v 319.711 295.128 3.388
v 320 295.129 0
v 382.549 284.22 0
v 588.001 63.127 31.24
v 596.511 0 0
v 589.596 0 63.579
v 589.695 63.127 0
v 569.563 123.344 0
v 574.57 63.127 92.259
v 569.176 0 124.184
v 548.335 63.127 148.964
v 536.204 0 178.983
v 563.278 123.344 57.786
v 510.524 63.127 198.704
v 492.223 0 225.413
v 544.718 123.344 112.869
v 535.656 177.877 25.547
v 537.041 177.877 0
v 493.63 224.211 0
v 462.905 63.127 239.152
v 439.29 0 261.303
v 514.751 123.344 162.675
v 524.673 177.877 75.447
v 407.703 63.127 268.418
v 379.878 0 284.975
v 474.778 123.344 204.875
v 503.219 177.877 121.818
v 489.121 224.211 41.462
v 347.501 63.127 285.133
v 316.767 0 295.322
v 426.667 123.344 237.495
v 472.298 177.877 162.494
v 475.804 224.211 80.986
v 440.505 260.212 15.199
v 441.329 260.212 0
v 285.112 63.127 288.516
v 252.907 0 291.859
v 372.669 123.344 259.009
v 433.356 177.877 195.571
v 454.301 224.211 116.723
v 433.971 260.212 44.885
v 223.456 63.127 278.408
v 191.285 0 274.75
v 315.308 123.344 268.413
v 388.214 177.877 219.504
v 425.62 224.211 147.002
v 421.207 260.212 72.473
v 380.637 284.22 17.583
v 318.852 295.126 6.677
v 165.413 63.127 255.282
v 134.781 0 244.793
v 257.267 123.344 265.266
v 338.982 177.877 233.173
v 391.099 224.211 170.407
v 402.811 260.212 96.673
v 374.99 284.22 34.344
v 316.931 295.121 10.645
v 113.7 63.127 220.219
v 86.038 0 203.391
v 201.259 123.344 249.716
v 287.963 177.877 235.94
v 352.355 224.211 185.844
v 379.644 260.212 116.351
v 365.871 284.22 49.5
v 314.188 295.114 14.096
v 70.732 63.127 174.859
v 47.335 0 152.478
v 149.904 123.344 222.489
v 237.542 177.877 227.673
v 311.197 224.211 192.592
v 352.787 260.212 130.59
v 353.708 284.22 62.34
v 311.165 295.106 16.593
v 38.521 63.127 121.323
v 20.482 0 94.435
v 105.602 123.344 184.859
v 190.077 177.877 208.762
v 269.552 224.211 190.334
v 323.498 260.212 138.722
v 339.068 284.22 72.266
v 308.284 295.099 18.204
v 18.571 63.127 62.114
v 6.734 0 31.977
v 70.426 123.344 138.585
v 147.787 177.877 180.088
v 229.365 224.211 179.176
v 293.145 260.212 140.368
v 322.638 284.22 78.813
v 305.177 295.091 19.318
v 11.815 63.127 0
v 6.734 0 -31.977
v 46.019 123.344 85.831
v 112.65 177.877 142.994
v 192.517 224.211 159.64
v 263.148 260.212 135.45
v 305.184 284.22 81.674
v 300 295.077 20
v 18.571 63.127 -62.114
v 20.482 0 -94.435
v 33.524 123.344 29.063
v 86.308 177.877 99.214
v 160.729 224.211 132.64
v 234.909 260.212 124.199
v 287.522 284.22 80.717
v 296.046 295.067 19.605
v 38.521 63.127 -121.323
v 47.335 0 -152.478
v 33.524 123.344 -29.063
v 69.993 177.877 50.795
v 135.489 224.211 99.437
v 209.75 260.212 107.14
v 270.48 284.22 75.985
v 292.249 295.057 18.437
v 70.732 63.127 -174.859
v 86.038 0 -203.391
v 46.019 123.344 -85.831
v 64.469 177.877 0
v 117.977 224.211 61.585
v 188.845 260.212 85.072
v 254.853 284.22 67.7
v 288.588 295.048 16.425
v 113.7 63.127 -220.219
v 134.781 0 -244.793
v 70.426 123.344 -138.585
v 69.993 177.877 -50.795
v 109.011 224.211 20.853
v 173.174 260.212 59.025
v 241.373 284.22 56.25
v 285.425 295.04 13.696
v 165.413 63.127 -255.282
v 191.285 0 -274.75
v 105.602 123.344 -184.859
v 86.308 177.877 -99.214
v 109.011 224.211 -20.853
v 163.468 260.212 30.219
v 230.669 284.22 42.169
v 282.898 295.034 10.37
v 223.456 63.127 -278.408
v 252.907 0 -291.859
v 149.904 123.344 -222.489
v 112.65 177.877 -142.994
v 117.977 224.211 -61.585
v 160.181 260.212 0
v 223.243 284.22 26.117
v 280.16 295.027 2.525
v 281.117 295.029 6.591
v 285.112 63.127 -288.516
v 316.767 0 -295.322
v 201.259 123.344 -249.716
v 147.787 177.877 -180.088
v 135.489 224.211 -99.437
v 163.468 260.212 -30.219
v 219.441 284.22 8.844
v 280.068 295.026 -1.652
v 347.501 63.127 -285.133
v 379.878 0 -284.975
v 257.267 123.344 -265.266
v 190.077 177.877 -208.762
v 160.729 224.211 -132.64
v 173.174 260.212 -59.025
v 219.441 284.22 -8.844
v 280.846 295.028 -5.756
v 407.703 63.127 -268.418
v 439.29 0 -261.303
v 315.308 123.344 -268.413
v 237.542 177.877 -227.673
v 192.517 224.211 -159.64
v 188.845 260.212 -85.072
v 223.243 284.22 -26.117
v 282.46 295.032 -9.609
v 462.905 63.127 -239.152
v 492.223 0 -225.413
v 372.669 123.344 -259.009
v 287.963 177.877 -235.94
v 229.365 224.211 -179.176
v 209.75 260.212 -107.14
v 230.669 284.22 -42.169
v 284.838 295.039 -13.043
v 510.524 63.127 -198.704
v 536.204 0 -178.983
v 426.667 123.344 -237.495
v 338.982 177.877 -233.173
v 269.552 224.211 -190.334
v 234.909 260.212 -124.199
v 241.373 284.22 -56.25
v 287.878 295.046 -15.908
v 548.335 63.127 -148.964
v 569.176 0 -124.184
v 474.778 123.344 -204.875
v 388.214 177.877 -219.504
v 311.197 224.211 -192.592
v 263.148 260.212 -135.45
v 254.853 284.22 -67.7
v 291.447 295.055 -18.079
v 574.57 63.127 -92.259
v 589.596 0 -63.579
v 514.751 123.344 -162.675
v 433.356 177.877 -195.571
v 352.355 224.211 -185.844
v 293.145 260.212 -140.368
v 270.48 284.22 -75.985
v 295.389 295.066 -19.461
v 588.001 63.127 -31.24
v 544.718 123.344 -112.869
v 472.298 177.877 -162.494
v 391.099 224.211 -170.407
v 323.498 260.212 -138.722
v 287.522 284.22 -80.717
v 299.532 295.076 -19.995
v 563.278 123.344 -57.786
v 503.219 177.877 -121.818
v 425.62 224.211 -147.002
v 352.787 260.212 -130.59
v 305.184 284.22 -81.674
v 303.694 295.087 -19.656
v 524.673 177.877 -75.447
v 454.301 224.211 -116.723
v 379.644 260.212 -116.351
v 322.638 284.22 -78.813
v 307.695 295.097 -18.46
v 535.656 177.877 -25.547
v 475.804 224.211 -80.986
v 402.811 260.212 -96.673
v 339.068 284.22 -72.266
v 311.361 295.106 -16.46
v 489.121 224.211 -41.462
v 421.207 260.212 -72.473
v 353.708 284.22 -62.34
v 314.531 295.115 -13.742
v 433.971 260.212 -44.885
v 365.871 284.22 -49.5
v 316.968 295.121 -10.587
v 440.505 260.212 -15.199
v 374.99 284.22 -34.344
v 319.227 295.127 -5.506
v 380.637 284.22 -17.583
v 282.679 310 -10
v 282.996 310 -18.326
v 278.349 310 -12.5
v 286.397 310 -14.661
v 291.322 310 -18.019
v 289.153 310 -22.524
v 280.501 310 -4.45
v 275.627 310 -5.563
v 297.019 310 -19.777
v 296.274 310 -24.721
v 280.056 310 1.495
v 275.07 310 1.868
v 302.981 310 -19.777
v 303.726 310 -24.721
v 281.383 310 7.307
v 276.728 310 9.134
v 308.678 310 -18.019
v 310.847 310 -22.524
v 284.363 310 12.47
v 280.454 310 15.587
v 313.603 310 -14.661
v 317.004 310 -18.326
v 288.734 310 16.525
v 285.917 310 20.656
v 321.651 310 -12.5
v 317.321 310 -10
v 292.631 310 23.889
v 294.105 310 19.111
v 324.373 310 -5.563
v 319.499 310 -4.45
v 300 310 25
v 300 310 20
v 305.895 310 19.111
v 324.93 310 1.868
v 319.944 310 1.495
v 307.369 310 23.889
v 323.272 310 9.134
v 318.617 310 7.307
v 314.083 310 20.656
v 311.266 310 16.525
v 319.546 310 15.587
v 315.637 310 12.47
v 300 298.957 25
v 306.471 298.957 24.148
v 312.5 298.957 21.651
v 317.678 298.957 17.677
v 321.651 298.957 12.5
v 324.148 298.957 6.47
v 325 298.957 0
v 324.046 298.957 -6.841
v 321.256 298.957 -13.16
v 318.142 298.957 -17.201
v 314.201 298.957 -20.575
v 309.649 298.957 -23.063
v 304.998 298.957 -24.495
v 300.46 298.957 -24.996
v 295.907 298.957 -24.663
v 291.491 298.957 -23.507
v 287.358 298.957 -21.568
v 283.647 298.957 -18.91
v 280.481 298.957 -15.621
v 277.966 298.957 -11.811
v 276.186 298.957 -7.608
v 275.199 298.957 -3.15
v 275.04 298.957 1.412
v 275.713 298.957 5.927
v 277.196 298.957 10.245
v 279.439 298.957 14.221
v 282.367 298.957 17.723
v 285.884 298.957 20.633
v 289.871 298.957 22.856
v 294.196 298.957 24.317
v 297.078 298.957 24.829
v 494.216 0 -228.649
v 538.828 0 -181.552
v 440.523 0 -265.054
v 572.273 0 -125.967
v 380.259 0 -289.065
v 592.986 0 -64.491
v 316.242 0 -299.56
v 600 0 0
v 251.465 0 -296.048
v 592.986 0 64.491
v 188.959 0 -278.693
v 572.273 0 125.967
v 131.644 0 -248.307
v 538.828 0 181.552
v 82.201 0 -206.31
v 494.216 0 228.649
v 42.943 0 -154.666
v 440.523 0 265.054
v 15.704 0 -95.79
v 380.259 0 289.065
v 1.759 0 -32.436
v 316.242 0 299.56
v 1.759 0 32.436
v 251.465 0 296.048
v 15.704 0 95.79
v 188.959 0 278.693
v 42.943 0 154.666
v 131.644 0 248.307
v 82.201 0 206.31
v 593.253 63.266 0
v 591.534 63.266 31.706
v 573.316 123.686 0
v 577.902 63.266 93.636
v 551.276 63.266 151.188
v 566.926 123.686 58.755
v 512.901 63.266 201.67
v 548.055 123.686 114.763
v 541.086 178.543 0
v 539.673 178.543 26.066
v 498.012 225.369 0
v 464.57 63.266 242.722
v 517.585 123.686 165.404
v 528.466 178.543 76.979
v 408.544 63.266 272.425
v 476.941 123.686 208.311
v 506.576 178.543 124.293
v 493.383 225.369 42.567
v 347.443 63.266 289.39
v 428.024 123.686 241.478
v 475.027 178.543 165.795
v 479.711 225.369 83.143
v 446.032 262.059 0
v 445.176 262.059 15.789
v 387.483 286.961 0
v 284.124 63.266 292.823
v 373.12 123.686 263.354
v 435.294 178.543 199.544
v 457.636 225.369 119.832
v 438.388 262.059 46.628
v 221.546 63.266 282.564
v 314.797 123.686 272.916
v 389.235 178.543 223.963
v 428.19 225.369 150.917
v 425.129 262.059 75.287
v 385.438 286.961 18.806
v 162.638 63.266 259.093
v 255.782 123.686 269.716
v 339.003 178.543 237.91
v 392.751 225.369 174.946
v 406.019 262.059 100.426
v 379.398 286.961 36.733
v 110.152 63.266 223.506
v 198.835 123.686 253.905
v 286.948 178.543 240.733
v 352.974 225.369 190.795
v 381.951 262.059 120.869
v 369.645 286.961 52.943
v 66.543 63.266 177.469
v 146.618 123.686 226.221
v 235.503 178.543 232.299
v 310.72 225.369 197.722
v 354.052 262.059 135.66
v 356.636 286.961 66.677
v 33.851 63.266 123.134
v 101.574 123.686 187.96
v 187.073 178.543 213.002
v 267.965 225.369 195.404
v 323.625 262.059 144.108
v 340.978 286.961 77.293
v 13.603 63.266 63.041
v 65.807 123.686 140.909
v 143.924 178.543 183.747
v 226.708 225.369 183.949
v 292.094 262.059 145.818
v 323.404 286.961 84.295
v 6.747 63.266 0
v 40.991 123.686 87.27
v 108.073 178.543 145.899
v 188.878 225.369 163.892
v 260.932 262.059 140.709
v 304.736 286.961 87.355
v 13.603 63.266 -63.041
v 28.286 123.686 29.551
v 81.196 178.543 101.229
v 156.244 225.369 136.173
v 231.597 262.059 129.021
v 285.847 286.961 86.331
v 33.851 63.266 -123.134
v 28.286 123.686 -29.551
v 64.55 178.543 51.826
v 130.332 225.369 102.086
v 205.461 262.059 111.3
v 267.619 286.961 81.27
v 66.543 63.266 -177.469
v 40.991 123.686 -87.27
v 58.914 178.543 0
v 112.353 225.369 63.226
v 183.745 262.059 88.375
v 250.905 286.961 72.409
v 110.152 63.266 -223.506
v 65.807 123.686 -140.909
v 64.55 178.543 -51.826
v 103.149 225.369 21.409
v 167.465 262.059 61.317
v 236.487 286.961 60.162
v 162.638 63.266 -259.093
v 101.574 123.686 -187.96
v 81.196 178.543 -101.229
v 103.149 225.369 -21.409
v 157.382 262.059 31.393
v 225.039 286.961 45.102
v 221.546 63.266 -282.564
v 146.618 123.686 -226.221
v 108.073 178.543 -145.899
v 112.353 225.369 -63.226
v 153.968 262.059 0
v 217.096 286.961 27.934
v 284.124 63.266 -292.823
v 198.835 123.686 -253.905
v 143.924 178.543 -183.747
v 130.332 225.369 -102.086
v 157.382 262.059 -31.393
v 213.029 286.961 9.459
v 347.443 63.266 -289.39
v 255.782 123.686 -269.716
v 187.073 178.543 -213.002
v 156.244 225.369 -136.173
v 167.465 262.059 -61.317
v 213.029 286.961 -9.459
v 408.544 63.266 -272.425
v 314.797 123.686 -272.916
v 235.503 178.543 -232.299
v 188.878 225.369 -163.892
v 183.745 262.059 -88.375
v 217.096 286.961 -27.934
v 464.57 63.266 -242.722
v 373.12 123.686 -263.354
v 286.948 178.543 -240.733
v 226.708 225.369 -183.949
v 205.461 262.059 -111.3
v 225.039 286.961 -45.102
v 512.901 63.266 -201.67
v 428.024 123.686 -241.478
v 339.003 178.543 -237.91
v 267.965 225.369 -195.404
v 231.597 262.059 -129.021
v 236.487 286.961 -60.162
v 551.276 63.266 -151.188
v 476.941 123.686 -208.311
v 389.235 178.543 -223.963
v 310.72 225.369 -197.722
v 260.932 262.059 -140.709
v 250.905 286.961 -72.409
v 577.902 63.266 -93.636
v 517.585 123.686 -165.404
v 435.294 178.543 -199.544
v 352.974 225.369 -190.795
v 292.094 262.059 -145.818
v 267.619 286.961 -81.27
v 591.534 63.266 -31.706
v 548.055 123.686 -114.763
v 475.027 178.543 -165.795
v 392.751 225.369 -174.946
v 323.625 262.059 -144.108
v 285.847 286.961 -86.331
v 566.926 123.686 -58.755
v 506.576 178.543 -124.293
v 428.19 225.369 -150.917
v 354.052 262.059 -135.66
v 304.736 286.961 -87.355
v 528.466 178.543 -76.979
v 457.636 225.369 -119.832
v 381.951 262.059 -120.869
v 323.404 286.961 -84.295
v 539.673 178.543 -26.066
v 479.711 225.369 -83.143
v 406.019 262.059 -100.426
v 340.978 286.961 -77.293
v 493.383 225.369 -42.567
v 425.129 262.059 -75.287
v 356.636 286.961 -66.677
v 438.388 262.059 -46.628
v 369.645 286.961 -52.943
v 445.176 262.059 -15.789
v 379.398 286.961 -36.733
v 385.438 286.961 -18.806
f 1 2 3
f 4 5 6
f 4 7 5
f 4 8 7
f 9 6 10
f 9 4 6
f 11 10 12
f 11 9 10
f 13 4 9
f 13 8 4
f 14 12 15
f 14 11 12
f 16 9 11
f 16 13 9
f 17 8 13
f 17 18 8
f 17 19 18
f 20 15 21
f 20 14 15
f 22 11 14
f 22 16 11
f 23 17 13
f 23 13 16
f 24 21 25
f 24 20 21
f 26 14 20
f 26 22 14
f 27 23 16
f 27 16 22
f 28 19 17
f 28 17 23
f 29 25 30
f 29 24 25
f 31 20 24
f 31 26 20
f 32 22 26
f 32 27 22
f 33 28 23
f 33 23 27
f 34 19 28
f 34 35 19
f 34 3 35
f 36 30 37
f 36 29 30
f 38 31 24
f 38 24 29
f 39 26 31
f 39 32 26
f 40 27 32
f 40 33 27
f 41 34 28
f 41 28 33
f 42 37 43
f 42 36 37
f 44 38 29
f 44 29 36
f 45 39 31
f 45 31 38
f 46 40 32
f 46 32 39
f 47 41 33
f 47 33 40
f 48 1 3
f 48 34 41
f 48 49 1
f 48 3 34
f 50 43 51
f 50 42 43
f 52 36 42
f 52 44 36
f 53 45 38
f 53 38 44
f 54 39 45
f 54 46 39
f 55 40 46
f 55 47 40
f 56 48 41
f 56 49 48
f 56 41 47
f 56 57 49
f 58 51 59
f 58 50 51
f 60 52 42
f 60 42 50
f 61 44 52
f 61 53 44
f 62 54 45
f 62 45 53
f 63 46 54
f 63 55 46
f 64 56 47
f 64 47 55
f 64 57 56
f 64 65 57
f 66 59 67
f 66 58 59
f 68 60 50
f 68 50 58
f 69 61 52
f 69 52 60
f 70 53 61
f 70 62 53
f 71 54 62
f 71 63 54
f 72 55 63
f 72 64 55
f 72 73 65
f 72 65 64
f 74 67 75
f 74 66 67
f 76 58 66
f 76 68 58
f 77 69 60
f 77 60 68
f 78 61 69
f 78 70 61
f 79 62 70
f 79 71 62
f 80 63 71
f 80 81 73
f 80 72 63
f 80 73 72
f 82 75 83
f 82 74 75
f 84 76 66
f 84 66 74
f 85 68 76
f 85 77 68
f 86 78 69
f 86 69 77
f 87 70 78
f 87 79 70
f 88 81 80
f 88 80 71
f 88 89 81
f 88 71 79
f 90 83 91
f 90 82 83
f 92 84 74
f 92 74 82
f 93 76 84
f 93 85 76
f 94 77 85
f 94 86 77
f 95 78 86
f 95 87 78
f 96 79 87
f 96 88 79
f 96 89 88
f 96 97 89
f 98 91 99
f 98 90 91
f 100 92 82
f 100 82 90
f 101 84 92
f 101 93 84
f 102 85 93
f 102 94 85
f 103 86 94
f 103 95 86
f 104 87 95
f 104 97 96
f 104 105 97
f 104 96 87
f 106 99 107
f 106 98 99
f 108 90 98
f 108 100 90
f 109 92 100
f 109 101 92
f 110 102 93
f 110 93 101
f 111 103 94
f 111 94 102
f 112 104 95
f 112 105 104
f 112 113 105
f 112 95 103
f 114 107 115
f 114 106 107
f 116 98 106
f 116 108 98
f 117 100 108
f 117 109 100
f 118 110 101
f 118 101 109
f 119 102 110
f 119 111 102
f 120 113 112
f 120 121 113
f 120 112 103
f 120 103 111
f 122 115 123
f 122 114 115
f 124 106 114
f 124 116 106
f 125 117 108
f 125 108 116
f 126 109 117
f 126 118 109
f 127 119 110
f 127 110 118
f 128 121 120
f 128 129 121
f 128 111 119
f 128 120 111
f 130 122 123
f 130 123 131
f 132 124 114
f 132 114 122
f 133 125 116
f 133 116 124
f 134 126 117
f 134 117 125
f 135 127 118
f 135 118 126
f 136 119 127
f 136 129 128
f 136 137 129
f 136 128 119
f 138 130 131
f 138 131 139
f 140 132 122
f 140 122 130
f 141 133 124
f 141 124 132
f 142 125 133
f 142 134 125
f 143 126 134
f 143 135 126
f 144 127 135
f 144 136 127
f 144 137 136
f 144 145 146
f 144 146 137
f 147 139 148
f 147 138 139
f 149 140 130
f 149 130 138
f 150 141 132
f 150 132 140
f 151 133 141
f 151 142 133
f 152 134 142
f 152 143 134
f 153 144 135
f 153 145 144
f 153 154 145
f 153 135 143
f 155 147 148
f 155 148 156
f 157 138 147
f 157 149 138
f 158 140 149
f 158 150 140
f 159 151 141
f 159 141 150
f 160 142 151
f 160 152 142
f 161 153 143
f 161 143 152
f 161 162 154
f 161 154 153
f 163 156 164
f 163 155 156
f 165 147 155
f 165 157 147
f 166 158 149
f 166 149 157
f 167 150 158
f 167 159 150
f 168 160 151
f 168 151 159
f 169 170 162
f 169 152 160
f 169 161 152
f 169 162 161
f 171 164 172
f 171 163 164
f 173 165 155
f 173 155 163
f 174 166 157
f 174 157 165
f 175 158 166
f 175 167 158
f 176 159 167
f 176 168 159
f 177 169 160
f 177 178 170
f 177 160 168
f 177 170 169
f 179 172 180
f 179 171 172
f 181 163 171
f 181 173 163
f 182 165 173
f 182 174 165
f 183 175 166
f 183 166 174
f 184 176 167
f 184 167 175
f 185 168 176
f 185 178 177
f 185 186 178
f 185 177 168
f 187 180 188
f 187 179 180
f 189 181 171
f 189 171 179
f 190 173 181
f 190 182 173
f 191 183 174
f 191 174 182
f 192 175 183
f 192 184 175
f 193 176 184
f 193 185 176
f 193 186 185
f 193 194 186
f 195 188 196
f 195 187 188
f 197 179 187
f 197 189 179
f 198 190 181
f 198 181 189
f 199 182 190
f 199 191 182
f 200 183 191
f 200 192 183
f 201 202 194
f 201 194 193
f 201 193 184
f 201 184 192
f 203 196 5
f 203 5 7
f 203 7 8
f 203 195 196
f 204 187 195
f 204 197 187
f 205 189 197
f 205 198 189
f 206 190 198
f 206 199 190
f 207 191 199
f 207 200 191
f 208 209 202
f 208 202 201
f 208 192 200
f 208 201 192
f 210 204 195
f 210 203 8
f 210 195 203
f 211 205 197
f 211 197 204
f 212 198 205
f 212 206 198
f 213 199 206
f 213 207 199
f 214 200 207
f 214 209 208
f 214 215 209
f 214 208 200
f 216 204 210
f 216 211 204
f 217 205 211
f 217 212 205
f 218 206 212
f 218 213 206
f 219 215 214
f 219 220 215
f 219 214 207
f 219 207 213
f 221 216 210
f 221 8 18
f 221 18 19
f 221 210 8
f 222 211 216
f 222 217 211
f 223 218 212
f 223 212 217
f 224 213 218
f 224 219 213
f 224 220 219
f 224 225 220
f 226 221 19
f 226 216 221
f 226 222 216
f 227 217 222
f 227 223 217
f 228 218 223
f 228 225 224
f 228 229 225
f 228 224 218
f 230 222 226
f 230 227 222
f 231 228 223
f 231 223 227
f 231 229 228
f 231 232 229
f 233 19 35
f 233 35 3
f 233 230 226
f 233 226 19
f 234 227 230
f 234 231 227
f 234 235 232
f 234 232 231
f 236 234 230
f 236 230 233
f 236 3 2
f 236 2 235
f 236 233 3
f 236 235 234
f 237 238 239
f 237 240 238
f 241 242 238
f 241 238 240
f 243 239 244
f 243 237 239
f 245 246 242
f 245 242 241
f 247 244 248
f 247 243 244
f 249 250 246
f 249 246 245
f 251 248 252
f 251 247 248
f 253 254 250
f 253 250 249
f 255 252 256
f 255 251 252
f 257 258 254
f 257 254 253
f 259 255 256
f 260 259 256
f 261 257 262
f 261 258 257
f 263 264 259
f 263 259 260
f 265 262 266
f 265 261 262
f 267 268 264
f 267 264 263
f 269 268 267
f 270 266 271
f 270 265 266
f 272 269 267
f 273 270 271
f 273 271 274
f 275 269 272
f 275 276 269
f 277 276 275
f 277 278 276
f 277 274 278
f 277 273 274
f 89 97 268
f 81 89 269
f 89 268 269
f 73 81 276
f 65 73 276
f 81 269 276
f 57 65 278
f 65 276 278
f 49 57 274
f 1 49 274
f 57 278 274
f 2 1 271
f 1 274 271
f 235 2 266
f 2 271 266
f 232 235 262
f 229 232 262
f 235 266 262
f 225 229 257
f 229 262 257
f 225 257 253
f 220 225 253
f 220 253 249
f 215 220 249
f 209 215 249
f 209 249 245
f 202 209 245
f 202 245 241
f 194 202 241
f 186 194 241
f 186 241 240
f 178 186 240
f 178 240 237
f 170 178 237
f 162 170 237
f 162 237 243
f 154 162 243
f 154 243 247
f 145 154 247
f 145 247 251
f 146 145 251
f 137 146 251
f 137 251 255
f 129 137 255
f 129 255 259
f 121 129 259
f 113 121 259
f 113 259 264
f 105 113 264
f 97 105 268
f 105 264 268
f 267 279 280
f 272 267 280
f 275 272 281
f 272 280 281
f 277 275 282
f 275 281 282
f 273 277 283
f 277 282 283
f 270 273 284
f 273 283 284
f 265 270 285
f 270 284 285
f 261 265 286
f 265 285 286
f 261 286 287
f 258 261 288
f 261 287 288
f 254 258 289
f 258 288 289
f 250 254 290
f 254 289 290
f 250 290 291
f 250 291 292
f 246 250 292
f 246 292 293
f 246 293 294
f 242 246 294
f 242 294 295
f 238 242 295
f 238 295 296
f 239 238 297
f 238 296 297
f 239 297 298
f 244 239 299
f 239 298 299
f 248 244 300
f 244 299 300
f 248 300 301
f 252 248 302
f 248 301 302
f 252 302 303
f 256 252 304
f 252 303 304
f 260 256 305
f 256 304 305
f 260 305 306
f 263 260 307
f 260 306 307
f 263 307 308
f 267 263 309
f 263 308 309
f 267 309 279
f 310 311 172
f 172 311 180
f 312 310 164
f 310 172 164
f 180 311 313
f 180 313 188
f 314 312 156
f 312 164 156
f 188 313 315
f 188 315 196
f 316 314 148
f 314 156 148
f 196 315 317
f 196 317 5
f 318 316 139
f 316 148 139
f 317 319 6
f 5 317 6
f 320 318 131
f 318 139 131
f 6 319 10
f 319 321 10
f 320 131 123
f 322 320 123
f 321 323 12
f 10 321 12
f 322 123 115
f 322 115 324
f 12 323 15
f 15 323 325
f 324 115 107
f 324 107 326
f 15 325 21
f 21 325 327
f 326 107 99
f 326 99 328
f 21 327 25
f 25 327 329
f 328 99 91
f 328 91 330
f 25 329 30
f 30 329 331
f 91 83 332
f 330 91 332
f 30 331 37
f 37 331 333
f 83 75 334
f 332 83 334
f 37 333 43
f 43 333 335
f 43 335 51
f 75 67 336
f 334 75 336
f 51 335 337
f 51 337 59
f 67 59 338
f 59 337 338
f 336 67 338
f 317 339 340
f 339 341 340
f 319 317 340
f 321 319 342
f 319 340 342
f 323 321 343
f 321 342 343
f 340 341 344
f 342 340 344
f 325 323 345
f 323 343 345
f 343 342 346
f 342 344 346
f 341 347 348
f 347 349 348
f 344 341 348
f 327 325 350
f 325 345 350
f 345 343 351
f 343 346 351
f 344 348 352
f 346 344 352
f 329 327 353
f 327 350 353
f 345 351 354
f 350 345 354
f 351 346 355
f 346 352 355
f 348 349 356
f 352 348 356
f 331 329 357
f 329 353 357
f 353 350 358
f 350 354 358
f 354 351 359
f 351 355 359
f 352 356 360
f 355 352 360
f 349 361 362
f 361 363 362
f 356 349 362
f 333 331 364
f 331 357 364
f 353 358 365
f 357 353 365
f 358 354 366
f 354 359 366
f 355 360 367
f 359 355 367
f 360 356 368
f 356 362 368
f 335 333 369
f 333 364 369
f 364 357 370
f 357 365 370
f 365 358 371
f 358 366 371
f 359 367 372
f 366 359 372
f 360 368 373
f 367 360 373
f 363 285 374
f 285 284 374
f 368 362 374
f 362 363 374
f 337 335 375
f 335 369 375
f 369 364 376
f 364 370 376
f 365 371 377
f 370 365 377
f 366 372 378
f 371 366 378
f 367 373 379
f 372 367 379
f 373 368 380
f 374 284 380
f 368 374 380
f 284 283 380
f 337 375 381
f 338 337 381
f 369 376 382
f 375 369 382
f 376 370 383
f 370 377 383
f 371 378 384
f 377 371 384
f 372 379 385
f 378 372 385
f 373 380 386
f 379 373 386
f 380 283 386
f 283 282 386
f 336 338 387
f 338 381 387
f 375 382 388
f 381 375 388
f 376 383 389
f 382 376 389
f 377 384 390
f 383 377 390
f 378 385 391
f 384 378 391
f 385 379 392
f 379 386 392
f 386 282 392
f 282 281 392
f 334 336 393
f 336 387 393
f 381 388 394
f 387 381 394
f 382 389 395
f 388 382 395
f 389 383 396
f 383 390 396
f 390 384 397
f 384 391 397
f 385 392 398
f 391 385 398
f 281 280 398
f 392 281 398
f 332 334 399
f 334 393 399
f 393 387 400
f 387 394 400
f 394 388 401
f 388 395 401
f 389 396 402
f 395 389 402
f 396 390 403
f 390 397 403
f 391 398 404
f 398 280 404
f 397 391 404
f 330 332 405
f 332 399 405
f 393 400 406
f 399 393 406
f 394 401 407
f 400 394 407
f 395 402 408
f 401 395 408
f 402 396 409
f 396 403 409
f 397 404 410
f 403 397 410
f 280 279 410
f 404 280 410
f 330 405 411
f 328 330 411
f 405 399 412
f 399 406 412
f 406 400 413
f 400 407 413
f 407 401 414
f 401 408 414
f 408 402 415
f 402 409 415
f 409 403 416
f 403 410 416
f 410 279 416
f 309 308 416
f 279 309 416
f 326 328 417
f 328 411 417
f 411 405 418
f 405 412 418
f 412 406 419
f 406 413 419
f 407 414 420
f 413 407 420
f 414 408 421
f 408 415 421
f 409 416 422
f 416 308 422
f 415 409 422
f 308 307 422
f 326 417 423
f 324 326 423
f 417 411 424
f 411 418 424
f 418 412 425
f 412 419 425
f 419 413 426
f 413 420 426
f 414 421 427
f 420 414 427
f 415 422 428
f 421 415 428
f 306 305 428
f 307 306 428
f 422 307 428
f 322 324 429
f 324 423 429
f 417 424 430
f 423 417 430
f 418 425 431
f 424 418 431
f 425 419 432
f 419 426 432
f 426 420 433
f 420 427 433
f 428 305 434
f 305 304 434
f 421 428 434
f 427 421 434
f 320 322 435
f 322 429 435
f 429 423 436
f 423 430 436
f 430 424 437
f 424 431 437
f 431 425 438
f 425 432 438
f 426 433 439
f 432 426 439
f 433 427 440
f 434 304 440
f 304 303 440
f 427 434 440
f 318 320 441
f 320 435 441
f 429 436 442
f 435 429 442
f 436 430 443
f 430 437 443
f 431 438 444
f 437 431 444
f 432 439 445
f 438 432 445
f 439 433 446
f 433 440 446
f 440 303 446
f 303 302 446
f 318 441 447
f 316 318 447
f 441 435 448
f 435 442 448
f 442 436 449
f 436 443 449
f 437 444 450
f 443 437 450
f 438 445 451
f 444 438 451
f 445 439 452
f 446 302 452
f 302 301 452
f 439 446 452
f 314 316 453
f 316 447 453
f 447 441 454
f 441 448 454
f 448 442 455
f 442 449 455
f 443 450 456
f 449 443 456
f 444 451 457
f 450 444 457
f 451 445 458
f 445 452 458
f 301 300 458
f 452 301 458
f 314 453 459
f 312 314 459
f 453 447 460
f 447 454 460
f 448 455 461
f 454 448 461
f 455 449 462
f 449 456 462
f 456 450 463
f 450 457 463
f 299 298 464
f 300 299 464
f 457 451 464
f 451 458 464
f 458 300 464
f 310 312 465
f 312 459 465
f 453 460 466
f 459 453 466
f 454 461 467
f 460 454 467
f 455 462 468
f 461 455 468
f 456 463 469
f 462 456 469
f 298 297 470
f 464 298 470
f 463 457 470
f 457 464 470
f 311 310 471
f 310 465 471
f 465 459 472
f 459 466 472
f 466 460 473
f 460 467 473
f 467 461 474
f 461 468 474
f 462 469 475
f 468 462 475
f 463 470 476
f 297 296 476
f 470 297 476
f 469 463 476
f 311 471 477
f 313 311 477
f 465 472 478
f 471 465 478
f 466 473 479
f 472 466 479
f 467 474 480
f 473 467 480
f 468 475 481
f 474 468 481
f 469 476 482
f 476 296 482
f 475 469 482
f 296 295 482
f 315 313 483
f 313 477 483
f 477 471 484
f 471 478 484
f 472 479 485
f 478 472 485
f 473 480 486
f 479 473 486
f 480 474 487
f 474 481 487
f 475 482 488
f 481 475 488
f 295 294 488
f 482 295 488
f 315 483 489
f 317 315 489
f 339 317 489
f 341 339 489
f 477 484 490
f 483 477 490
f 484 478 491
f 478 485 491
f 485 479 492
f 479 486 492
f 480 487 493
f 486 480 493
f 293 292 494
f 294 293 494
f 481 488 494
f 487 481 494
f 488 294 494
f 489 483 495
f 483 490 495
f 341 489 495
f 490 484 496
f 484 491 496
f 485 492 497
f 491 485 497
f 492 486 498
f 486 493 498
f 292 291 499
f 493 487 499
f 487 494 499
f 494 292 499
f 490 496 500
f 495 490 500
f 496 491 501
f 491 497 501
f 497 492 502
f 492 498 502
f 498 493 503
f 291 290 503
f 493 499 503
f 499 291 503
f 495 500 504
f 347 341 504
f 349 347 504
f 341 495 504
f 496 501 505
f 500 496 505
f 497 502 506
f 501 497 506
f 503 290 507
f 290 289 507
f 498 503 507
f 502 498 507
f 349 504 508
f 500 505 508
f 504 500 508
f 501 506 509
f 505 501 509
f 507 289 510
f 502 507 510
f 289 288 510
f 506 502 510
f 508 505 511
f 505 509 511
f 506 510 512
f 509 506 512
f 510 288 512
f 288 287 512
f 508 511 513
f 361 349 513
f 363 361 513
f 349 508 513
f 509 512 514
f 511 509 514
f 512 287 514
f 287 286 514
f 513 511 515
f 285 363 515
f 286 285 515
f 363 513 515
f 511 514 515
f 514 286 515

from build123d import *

# Parameters (mm, degrees)
SKETCH3_R           = 25
BOSS_EXTRUDE1_DEPTH = 310
SKETCH6_R           = 20
CUT_EXTRUDE2_DEPTH  = 330


with BuildPart() as part:
    # Sketch1 → Revolve1 (revolve)
    with BuildSketch(Plane.XY, mode=Mode.PRIVATE) as revolve1_sk:
        with BuildLine():
            Line((5, 0), (0, 0))
            ThreePointArc((0, 0), (87.867965644, 212.132034356), (300, 300))
            Line((300, 300), (300, 295))
            ThreePointArc((300, 295), (91.40349955, 208.59650045), (5, 0))
        make_face()
    revolve(revolve1_sk.sketch.rotate(Axis((300, 300, 0), (0, -1, 0)), 180), axis=Axis((300, 300, 0), (0, -1, 0)))

    # Sketch3 → Boss-Extrude1 (add)
    with BuildSketch(Plane(origin=(0, 0, 0), x_dir=(1, 0, 0), z_dir=(0, 1, 0))):
        with Locations(Location((300, 0, 0), (0, 0, 270))):
            Circle(SKETCH3_R)
    extrude(amount=BOSS_EXTRUDE1_DEPTH)

    # Sketch5 → Cut-Revolve1 (revolve, cut)
    with BuildSketch(Plane.XY, mode=Mode.PRIVATE) as cut_revolve1_sk:
        with BuildLine():
            Line((300.755316248, 295.755316248), (300.755316248, 0))
            Line((300.755316248, 0), (5, 0))
            ThreePointArc((5, 0), (91.624726557, 209.130589691), (300.755316248, 295.755316248))
        make_face()
    revolve(cut_revolve1_sk.sketch.rotate(Axis((300.755316248, 295.755316248, 0), (0, -1, 0)), 180), axis=Axis((300.755316248, 295.755316248, 0), (0, -1, 0)), mode=Mode.SUBTRACT)

    # Sketch6 → Cut-Extrude2 (cut)
    with BuildSketch(Plane(origin=(0, 310, 0), x_dir=(1, 0, 0), z_dir=(0, 1, 0))):
        with Locations(Location((300, 0, 0), (0, 0, 270))):
            Circle(SKETCH6_R)
    extrude(amount=-CUT_EXTRUDE2_DEPTH, mode=Mode.SUBTRACT)


solid = part.part
